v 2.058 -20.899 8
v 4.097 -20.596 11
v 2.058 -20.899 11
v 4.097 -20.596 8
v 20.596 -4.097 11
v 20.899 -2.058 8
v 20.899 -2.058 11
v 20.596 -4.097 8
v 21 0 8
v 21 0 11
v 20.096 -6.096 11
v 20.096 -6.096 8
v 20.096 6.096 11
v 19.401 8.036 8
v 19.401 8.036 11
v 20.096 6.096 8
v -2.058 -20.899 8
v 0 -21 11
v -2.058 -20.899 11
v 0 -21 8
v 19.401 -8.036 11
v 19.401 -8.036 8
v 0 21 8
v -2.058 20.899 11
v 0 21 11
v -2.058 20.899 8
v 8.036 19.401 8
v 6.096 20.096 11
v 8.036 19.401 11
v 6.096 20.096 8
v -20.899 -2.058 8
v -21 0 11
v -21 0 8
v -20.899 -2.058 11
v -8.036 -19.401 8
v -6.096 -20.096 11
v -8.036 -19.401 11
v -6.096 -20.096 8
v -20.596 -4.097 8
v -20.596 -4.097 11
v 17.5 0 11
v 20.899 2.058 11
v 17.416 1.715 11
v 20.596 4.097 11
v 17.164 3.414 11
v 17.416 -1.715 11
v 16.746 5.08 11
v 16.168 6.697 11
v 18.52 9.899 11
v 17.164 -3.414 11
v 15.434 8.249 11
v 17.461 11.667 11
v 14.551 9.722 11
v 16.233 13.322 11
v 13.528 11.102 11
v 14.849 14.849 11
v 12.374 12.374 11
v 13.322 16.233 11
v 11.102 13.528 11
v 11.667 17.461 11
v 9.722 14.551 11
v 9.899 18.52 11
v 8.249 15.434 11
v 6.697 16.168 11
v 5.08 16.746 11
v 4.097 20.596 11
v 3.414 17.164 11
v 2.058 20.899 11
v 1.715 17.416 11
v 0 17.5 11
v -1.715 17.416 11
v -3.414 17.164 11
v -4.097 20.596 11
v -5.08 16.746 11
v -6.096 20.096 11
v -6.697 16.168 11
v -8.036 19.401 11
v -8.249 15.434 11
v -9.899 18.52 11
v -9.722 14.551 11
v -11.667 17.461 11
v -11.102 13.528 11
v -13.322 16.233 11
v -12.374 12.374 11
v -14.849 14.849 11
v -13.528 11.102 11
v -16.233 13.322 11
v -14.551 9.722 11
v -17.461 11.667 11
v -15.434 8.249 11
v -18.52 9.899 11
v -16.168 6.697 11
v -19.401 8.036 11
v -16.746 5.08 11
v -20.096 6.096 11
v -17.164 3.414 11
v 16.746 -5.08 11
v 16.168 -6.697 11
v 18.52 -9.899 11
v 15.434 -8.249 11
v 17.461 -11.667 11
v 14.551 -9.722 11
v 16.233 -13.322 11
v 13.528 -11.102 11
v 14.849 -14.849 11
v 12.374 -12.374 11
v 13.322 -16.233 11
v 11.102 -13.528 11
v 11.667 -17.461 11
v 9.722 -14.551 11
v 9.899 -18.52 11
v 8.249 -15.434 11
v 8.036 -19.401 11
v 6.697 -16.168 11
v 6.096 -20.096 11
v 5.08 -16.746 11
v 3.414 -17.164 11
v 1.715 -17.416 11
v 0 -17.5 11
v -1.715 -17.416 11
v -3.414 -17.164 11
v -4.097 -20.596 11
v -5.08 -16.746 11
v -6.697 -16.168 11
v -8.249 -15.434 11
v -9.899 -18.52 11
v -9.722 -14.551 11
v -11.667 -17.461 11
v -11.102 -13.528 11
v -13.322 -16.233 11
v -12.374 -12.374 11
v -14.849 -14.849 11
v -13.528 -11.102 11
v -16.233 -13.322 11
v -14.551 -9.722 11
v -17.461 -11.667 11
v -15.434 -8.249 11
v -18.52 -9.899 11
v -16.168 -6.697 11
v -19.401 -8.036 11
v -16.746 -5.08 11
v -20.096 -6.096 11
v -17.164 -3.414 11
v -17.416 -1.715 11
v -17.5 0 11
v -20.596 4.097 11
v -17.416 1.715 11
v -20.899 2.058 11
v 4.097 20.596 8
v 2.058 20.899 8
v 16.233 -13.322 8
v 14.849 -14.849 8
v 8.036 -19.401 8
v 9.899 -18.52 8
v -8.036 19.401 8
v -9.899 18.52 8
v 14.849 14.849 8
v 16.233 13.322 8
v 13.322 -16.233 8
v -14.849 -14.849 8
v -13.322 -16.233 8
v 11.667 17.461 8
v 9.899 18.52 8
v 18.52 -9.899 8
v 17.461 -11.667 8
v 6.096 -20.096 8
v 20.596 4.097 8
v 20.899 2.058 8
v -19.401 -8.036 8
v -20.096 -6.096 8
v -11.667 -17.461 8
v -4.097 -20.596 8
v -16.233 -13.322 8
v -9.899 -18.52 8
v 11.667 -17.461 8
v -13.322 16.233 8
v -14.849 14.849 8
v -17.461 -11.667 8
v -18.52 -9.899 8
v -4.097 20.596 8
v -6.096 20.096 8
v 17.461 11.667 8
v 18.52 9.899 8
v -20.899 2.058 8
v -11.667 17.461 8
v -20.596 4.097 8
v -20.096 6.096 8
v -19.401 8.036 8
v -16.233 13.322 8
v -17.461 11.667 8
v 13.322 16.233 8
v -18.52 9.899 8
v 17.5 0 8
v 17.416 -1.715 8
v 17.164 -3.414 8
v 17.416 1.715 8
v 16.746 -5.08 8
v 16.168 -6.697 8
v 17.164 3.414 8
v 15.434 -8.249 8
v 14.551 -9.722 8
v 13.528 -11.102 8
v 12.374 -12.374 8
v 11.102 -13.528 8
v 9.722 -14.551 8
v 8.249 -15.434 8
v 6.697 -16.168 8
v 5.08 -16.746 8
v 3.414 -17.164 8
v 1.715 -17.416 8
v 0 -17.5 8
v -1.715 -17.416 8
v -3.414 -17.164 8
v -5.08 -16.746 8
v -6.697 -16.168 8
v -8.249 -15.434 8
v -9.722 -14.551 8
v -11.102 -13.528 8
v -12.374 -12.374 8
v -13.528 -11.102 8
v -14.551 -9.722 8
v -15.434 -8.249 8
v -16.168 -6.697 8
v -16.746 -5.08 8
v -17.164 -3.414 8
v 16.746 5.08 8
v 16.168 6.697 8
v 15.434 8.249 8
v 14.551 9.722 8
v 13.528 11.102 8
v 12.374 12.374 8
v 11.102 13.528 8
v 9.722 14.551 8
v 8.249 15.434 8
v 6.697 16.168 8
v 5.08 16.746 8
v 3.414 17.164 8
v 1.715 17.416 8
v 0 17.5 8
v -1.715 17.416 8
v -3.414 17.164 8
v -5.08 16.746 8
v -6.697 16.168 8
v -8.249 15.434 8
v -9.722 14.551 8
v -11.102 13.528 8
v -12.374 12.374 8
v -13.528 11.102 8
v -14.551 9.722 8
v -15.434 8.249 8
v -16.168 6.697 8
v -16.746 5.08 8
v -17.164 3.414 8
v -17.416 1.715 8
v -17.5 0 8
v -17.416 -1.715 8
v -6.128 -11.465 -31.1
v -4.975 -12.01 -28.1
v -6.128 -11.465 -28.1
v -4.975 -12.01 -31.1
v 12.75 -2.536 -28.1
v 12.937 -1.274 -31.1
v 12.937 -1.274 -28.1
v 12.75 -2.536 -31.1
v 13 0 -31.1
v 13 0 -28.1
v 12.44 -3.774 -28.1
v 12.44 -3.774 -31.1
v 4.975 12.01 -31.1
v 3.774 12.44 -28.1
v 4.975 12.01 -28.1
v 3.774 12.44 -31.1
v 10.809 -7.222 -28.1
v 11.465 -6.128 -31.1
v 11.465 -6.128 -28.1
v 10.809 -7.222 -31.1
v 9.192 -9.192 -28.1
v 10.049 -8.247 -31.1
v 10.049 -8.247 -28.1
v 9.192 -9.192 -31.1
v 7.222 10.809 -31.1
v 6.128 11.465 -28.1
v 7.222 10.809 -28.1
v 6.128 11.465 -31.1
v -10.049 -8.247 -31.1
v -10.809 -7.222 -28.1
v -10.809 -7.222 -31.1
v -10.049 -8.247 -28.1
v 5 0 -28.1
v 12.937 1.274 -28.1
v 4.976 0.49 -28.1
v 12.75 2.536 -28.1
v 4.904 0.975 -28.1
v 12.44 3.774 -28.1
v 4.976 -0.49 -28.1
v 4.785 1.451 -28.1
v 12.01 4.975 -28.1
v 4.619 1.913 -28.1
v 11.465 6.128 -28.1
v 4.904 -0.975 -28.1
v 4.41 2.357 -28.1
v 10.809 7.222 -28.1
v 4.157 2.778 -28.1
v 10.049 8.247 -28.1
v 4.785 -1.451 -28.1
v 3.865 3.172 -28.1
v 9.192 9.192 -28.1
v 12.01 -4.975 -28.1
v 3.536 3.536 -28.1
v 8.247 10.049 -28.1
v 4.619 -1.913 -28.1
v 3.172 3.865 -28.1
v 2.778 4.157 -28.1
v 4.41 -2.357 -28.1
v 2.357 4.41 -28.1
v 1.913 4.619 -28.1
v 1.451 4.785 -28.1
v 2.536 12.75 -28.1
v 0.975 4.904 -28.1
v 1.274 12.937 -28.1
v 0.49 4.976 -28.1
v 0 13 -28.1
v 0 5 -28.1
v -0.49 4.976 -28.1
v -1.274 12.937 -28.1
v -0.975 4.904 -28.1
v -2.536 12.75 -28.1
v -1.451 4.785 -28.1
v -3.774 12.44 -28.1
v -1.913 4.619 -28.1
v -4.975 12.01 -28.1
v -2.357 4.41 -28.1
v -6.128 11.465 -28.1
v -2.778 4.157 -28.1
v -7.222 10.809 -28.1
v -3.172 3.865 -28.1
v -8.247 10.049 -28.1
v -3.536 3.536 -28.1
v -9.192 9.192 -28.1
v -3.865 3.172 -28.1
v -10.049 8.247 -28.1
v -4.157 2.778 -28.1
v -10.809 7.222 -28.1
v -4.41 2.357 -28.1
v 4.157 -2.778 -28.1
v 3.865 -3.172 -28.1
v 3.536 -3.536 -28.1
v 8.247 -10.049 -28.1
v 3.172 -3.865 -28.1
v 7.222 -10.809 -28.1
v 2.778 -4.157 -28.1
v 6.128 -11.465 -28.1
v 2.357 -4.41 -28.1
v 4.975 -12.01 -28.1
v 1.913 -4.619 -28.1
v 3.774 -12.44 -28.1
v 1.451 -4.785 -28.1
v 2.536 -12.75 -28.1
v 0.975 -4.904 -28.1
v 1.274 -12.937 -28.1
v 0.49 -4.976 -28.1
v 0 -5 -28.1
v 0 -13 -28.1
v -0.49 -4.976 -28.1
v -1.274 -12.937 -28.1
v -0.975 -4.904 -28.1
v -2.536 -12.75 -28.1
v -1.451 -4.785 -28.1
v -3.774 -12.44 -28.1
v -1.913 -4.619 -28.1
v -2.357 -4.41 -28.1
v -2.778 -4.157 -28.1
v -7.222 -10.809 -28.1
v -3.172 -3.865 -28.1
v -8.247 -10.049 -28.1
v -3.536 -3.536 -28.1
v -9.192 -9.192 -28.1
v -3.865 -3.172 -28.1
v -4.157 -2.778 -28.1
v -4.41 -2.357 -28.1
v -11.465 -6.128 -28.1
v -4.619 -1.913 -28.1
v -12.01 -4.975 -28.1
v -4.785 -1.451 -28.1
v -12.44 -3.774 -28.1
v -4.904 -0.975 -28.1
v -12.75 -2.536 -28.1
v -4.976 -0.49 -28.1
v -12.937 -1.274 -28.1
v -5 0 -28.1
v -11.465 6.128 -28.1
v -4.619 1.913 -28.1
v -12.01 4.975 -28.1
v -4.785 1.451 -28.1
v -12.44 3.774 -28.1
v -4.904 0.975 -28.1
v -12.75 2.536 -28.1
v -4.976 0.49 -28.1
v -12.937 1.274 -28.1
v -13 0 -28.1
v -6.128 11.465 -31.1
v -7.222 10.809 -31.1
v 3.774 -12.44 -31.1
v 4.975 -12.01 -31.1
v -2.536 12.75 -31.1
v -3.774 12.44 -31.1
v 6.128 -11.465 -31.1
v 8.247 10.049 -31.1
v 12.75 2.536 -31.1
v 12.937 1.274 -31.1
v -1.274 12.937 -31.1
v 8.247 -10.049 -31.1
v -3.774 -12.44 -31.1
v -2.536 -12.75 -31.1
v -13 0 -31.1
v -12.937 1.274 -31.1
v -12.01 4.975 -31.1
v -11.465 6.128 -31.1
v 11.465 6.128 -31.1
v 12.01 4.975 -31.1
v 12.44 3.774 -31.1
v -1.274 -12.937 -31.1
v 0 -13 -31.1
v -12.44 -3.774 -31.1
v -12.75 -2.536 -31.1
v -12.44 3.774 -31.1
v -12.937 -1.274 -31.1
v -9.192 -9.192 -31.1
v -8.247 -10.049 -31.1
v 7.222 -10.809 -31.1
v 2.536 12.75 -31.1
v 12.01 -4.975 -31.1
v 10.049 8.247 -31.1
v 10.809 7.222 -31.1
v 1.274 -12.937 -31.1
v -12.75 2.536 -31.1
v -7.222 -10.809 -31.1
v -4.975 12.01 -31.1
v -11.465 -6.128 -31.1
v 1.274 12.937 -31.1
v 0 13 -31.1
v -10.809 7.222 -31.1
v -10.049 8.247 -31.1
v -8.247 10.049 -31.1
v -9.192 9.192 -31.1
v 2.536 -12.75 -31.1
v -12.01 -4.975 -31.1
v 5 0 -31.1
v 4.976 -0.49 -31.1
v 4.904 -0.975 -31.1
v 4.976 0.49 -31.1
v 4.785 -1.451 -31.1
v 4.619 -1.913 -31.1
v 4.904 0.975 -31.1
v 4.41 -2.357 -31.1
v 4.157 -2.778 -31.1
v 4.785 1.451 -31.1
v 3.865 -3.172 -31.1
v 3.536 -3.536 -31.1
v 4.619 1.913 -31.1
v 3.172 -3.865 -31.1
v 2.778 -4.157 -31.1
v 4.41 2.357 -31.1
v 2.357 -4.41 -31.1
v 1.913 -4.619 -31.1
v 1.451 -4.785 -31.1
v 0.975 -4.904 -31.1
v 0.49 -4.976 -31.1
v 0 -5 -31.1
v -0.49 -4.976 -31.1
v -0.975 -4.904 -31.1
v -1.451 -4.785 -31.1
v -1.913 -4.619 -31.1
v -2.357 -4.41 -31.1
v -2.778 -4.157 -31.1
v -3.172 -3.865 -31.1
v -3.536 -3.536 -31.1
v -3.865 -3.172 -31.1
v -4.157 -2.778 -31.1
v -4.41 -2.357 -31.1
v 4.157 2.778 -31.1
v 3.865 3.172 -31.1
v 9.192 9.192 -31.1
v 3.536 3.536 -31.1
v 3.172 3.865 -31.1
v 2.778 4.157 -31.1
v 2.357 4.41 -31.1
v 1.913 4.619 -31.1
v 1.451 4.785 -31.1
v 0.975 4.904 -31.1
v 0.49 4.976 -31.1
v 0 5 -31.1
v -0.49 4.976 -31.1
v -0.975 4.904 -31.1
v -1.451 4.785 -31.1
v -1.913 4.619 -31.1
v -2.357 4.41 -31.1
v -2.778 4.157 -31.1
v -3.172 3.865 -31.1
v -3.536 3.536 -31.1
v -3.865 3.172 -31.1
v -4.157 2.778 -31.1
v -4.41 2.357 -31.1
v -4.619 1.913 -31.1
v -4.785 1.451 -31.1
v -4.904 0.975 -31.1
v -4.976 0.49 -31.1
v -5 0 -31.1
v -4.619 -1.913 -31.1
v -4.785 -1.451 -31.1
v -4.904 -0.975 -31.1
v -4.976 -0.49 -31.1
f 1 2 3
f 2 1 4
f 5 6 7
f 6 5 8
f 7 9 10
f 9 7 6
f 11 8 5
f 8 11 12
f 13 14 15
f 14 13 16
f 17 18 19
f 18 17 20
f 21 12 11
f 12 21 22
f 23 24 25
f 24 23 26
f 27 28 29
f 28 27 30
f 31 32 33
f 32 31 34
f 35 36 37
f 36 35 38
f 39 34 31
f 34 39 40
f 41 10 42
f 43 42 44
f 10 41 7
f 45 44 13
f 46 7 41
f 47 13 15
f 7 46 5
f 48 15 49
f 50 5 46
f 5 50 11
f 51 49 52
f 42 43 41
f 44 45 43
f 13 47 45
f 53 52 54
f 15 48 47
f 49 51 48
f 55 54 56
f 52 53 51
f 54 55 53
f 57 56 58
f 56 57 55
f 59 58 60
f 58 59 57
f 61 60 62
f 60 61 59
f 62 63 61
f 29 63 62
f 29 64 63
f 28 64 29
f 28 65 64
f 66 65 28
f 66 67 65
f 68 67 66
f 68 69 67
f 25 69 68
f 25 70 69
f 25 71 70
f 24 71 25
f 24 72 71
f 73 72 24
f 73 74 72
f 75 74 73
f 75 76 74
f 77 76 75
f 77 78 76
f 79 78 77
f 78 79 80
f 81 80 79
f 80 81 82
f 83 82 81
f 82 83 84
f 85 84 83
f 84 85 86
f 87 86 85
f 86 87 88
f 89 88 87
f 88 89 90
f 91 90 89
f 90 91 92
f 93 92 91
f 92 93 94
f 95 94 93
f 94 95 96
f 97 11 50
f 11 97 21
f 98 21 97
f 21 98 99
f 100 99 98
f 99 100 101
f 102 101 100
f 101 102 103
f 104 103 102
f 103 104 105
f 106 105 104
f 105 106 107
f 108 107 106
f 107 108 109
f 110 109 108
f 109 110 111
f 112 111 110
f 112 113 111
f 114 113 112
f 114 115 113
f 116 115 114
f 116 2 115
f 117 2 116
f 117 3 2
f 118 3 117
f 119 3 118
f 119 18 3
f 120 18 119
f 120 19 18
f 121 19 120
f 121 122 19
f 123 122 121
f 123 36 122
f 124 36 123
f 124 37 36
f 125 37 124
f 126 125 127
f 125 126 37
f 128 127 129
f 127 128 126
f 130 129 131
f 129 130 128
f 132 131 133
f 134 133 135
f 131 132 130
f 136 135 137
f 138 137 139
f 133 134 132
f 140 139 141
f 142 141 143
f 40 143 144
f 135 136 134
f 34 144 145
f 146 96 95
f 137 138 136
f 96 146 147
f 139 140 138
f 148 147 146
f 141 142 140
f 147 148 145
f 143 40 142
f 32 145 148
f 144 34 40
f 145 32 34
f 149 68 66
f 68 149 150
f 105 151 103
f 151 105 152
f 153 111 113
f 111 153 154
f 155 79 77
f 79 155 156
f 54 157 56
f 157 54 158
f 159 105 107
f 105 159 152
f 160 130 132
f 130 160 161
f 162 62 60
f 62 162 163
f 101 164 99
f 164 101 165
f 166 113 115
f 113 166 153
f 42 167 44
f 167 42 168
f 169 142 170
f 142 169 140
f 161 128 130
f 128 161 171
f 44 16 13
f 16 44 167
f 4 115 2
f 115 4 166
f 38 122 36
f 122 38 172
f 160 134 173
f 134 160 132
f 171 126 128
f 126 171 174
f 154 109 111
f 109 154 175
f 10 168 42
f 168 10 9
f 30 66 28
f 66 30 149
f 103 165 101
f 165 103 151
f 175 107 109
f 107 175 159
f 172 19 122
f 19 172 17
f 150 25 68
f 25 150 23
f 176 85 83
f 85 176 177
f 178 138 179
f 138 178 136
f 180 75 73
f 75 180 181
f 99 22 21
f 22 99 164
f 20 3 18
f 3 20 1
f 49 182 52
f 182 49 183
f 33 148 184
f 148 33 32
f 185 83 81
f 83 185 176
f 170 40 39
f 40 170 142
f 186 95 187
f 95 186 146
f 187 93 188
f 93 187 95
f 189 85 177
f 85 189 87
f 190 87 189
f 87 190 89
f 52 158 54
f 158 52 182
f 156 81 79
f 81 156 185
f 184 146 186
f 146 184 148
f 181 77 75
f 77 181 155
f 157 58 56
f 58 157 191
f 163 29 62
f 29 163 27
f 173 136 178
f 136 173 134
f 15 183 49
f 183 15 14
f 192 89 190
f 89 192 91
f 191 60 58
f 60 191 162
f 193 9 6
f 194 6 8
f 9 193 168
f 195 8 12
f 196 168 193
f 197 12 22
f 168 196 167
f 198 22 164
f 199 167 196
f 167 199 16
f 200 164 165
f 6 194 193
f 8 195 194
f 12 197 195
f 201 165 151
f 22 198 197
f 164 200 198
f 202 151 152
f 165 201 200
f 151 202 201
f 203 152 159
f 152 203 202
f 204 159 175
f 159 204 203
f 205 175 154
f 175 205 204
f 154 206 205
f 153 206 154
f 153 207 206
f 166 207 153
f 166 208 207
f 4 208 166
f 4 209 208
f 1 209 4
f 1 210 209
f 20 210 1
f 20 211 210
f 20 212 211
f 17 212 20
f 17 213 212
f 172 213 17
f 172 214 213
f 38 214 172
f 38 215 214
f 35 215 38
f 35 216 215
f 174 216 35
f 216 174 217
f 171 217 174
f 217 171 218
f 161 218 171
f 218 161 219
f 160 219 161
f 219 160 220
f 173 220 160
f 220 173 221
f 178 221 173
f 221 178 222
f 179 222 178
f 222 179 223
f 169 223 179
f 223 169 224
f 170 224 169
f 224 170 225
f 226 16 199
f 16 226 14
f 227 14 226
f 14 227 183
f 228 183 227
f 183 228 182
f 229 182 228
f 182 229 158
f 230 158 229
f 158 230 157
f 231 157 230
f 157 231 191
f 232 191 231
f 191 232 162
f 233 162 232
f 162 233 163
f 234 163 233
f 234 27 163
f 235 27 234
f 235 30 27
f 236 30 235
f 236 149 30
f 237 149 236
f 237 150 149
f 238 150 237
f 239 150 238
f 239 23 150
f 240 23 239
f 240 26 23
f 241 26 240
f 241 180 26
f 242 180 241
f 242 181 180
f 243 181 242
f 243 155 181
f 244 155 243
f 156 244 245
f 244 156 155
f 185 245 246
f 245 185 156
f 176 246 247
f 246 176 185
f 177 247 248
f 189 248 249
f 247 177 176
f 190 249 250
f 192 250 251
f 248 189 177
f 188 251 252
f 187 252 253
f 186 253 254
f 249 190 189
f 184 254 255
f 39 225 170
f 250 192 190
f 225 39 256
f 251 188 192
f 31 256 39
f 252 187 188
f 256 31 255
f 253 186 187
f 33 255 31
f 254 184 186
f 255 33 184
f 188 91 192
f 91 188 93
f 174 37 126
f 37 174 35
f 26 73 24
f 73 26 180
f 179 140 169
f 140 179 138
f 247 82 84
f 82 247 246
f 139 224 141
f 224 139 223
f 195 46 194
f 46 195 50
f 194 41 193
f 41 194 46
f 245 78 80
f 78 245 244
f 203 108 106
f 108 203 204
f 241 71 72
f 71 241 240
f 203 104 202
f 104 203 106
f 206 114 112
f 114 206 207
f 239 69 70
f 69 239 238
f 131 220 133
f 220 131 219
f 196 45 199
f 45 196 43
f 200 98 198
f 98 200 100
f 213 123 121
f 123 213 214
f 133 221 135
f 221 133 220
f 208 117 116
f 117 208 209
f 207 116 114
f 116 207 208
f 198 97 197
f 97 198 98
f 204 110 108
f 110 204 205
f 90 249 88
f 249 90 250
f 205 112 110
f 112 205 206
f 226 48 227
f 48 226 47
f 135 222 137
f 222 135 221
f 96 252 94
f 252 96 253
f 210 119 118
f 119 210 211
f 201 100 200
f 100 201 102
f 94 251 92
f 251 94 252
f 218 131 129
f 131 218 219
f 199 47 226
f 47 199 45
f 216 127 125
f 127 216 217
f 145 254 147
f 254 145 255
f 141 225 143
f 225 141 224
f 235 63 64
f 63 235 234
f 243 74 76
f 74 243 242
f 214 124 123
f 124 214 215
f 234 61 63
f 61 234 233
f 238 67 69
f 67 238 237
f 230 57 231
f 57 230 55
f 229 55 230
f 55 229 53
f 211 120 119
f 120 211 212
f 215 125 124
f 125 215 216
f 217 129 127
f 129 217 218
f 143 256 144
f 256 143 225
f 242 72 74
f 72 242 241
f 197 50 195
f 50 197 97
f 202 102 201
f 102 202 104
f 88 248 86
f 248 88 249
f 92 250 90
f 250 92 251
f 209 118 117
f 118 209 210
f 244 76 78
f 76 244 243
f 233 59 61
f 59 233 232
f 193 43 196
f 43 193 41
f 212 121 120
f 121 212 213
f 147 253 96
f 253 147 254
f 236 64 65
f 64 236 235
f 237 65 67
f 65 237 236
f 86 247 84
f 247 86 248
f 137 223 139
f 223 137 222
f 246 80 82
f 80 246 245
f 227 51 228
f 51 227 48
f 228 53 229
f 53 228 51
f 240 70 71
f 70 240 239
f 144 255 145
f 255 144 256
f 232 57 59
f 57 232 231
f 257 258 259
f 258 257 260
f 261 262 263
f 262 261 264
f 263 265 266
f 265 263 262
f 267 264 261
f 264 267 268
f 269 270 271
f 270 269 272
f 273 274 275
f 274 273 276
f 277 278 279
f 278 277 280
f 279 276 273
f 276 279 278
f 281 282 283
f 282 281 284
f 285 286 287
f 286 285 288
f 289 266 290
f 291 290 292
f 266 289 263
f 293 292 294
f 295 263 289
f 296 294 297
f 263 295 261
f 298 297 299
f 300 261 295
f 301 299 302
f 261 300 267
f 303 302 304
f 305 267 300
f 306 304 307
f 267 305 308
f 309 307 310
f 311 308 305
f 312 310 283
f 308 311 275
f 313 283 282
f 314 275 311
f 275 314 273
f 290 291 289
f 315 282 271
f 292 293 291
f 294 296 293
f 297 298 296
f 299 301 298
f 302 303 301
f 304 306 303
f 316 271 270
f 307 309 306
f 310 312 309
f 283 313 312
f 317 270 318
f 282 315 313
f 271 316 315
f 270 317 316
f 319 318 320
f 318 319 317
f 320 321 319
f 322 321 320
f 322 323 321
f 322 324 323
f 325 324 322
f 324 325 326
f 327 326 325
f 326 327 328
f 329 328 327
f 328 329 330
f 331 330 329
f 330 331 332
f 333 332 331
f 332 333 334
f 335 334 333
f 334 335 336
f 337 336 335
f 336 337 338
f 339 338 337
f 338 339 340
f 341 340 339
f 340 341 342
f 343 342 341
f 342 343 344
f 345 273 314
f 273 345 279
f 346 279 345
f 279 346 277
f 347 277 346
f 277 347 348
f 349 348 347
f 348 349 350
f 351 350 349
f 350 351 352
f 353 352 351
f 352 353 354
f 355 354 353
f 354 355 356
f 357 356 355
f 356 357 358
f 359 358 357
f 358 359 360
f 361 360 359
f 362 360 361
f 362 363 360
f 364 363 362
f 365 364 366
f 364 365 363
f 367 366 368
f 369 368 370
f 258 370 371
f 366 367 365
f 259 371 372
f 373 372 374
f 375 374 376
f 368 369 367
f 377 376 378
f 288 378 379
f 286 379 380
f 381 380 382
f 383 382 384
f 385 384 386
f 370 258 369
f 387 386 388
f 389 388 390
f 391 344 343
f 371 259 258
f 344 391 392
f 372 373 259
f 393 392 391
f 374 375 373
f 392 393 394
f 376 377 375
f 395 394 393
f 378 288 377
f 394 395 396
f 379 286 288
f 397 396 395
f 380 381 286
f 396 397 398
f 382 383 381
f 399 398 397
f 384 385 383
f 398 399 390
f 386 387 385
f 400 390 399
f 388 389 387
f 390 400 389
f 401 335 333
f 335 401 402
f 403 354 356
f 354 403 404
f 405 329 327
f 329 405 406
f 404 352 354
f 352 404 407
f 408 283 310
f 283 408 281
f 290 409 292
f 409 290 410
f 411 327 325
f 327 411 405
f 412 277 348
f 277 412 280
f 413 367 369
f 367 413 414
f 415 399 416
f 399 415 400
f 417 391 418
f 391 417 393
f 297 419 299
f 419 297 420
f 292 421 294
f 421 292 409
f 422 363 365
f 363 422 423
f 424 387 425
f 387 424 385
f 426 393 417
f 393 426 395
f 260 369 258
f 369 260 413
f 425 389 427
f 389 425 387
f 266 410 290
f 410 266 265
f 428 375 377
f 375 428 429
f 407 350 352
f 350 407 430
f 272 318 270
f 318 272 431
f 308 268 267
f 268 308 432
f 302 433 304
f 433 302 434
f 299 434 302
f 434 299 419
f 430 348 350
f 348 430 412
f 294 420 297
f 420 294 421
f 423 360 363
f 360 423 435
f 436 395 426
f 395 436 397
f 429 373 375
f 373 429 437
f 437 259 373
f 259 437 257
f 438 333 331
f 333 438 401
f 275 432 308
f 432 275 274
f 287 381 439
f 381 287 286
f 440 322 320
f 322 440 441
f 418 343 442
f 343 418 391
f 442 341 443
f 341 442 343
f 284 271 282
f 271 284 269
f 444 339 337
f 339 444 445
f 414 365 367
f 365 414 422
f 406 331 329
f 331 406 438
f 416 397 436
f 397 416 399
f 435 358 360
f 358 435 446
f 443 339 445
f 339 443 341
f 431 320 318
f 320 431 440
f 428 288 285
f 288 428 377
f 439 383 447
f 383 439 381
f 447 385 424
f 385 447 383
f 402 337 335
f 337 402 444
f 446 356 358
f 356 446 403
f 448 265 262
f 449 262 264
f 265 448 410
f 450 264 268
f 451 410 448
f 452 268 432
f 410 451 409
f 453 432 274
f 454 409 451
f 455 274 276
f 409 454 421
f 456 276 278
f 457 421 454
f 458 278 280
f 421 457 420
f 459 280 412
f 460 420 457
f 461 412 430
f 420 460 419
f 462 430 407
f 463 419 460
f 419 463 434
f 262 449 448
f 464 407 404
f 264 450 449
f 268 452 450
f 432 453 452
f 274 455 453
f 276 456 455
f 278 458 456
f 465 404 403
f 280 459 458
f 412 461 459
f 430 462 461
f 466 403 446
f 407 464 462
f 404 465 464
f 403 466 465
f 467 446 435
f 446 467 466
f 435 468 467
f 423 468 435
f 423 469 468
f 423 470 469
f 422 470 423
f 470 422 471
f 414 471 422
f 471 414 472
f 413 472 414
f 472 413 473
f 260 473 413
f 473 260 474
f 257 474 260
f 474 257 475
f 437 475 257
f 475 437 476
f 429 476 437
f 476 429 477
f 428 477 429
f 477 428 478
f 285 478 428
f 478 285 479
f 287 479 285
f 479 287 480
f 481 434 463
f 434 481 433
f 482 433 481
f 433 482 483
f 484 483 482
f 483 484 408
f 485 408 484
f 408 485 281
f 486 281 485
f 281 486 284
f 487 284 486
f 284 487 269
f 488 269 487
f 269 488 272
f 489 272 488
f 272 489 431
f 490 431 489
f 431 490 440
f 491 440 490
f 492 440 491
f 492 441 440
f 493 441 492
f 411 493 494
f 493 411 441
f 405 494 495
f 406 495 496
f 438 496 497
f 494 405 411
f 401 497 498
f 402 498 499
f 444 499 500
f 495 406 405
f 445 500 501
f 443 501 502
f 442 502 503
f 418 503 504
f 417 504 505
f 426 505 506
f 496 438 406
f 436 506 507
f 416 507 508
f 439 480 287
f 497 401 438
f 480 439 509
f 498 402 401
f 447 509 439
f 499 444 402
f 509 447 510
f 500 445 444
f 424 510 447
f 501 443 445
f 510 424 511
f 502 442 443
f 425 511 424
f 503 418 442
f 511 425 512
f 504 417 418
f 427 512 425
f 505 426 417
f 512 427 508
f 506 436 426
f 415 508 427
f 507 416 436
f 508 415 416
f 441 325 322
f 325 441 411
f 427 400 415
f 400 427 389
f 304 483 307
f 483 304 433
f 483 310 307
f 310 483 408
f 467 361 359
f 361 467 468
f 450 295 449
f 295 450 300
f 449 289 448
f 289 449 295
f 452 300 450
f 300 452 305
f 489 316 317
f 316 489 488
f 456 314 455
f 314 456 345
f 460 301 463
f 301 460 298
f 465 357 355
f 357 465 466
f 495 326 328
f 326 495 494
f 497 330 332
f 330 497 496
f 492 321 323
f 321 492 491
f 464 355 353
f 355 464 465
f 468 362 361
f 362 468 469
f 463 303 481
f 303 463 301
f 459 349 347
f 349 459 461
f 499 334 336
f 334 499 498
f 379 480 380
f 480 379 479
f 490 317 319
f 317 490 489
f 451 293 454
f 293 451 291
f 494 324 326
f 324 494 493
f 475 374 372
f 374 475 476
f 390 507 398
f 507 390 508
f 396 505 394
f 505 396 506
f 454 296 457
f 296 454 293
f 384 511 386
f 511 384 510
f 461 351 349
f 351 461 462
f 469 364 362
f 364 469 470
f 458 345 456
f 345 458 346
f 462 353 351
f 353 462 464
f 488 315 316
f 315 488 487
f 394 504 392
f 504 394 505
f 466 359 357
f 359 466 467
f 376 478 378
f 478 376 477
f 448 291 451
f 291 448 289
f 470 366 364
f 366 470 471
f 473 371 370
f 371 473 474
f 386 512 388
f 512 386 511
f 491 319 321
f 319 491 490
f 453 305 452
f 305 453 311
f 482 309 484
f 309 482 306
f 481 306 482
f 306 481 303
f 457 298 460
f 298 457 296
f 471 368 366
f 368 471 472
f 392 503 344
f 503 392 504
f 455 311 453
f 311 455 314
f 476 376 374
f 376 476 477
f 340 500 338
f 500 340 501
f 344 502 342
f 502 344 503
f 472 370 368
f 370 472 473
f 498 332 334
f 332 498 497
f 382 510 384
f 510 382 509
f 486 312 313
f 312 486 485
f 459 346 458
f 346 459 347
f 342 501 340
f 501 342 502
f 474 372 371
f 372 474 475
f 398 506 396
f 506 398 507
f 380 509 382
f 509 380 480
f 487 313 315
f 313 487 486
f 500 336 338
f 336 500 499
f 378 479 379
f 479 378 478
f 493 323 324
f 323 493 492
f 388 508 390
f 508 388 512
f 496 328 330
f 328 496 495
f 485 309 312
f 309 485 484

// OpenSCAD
// ============================================================
// BEARINGS — Top + bottom bearing indicators
// ============================================================

include <../params.scad>

module bearings() {
    if (SHOW_BEARINGS) {
        color(C_BEARING, 0.9)
        zcyl_hollow(BEARING_BOT_OD, BEARING_BOT_ID, BEARING_BOT_Z, BEARING_BOT_H);
        color(C_BEARING, 0.9)
        zcyl_hollow(BEARING_TOP_OD, BEARING_TOP_ID, BEARING_TOP_Z, BEARING_TOP_H);
    }
}

// ============================================================
// STANDALONE PREVIEW
// ============================================================
rotate([180, 0, 0]) bearings();
